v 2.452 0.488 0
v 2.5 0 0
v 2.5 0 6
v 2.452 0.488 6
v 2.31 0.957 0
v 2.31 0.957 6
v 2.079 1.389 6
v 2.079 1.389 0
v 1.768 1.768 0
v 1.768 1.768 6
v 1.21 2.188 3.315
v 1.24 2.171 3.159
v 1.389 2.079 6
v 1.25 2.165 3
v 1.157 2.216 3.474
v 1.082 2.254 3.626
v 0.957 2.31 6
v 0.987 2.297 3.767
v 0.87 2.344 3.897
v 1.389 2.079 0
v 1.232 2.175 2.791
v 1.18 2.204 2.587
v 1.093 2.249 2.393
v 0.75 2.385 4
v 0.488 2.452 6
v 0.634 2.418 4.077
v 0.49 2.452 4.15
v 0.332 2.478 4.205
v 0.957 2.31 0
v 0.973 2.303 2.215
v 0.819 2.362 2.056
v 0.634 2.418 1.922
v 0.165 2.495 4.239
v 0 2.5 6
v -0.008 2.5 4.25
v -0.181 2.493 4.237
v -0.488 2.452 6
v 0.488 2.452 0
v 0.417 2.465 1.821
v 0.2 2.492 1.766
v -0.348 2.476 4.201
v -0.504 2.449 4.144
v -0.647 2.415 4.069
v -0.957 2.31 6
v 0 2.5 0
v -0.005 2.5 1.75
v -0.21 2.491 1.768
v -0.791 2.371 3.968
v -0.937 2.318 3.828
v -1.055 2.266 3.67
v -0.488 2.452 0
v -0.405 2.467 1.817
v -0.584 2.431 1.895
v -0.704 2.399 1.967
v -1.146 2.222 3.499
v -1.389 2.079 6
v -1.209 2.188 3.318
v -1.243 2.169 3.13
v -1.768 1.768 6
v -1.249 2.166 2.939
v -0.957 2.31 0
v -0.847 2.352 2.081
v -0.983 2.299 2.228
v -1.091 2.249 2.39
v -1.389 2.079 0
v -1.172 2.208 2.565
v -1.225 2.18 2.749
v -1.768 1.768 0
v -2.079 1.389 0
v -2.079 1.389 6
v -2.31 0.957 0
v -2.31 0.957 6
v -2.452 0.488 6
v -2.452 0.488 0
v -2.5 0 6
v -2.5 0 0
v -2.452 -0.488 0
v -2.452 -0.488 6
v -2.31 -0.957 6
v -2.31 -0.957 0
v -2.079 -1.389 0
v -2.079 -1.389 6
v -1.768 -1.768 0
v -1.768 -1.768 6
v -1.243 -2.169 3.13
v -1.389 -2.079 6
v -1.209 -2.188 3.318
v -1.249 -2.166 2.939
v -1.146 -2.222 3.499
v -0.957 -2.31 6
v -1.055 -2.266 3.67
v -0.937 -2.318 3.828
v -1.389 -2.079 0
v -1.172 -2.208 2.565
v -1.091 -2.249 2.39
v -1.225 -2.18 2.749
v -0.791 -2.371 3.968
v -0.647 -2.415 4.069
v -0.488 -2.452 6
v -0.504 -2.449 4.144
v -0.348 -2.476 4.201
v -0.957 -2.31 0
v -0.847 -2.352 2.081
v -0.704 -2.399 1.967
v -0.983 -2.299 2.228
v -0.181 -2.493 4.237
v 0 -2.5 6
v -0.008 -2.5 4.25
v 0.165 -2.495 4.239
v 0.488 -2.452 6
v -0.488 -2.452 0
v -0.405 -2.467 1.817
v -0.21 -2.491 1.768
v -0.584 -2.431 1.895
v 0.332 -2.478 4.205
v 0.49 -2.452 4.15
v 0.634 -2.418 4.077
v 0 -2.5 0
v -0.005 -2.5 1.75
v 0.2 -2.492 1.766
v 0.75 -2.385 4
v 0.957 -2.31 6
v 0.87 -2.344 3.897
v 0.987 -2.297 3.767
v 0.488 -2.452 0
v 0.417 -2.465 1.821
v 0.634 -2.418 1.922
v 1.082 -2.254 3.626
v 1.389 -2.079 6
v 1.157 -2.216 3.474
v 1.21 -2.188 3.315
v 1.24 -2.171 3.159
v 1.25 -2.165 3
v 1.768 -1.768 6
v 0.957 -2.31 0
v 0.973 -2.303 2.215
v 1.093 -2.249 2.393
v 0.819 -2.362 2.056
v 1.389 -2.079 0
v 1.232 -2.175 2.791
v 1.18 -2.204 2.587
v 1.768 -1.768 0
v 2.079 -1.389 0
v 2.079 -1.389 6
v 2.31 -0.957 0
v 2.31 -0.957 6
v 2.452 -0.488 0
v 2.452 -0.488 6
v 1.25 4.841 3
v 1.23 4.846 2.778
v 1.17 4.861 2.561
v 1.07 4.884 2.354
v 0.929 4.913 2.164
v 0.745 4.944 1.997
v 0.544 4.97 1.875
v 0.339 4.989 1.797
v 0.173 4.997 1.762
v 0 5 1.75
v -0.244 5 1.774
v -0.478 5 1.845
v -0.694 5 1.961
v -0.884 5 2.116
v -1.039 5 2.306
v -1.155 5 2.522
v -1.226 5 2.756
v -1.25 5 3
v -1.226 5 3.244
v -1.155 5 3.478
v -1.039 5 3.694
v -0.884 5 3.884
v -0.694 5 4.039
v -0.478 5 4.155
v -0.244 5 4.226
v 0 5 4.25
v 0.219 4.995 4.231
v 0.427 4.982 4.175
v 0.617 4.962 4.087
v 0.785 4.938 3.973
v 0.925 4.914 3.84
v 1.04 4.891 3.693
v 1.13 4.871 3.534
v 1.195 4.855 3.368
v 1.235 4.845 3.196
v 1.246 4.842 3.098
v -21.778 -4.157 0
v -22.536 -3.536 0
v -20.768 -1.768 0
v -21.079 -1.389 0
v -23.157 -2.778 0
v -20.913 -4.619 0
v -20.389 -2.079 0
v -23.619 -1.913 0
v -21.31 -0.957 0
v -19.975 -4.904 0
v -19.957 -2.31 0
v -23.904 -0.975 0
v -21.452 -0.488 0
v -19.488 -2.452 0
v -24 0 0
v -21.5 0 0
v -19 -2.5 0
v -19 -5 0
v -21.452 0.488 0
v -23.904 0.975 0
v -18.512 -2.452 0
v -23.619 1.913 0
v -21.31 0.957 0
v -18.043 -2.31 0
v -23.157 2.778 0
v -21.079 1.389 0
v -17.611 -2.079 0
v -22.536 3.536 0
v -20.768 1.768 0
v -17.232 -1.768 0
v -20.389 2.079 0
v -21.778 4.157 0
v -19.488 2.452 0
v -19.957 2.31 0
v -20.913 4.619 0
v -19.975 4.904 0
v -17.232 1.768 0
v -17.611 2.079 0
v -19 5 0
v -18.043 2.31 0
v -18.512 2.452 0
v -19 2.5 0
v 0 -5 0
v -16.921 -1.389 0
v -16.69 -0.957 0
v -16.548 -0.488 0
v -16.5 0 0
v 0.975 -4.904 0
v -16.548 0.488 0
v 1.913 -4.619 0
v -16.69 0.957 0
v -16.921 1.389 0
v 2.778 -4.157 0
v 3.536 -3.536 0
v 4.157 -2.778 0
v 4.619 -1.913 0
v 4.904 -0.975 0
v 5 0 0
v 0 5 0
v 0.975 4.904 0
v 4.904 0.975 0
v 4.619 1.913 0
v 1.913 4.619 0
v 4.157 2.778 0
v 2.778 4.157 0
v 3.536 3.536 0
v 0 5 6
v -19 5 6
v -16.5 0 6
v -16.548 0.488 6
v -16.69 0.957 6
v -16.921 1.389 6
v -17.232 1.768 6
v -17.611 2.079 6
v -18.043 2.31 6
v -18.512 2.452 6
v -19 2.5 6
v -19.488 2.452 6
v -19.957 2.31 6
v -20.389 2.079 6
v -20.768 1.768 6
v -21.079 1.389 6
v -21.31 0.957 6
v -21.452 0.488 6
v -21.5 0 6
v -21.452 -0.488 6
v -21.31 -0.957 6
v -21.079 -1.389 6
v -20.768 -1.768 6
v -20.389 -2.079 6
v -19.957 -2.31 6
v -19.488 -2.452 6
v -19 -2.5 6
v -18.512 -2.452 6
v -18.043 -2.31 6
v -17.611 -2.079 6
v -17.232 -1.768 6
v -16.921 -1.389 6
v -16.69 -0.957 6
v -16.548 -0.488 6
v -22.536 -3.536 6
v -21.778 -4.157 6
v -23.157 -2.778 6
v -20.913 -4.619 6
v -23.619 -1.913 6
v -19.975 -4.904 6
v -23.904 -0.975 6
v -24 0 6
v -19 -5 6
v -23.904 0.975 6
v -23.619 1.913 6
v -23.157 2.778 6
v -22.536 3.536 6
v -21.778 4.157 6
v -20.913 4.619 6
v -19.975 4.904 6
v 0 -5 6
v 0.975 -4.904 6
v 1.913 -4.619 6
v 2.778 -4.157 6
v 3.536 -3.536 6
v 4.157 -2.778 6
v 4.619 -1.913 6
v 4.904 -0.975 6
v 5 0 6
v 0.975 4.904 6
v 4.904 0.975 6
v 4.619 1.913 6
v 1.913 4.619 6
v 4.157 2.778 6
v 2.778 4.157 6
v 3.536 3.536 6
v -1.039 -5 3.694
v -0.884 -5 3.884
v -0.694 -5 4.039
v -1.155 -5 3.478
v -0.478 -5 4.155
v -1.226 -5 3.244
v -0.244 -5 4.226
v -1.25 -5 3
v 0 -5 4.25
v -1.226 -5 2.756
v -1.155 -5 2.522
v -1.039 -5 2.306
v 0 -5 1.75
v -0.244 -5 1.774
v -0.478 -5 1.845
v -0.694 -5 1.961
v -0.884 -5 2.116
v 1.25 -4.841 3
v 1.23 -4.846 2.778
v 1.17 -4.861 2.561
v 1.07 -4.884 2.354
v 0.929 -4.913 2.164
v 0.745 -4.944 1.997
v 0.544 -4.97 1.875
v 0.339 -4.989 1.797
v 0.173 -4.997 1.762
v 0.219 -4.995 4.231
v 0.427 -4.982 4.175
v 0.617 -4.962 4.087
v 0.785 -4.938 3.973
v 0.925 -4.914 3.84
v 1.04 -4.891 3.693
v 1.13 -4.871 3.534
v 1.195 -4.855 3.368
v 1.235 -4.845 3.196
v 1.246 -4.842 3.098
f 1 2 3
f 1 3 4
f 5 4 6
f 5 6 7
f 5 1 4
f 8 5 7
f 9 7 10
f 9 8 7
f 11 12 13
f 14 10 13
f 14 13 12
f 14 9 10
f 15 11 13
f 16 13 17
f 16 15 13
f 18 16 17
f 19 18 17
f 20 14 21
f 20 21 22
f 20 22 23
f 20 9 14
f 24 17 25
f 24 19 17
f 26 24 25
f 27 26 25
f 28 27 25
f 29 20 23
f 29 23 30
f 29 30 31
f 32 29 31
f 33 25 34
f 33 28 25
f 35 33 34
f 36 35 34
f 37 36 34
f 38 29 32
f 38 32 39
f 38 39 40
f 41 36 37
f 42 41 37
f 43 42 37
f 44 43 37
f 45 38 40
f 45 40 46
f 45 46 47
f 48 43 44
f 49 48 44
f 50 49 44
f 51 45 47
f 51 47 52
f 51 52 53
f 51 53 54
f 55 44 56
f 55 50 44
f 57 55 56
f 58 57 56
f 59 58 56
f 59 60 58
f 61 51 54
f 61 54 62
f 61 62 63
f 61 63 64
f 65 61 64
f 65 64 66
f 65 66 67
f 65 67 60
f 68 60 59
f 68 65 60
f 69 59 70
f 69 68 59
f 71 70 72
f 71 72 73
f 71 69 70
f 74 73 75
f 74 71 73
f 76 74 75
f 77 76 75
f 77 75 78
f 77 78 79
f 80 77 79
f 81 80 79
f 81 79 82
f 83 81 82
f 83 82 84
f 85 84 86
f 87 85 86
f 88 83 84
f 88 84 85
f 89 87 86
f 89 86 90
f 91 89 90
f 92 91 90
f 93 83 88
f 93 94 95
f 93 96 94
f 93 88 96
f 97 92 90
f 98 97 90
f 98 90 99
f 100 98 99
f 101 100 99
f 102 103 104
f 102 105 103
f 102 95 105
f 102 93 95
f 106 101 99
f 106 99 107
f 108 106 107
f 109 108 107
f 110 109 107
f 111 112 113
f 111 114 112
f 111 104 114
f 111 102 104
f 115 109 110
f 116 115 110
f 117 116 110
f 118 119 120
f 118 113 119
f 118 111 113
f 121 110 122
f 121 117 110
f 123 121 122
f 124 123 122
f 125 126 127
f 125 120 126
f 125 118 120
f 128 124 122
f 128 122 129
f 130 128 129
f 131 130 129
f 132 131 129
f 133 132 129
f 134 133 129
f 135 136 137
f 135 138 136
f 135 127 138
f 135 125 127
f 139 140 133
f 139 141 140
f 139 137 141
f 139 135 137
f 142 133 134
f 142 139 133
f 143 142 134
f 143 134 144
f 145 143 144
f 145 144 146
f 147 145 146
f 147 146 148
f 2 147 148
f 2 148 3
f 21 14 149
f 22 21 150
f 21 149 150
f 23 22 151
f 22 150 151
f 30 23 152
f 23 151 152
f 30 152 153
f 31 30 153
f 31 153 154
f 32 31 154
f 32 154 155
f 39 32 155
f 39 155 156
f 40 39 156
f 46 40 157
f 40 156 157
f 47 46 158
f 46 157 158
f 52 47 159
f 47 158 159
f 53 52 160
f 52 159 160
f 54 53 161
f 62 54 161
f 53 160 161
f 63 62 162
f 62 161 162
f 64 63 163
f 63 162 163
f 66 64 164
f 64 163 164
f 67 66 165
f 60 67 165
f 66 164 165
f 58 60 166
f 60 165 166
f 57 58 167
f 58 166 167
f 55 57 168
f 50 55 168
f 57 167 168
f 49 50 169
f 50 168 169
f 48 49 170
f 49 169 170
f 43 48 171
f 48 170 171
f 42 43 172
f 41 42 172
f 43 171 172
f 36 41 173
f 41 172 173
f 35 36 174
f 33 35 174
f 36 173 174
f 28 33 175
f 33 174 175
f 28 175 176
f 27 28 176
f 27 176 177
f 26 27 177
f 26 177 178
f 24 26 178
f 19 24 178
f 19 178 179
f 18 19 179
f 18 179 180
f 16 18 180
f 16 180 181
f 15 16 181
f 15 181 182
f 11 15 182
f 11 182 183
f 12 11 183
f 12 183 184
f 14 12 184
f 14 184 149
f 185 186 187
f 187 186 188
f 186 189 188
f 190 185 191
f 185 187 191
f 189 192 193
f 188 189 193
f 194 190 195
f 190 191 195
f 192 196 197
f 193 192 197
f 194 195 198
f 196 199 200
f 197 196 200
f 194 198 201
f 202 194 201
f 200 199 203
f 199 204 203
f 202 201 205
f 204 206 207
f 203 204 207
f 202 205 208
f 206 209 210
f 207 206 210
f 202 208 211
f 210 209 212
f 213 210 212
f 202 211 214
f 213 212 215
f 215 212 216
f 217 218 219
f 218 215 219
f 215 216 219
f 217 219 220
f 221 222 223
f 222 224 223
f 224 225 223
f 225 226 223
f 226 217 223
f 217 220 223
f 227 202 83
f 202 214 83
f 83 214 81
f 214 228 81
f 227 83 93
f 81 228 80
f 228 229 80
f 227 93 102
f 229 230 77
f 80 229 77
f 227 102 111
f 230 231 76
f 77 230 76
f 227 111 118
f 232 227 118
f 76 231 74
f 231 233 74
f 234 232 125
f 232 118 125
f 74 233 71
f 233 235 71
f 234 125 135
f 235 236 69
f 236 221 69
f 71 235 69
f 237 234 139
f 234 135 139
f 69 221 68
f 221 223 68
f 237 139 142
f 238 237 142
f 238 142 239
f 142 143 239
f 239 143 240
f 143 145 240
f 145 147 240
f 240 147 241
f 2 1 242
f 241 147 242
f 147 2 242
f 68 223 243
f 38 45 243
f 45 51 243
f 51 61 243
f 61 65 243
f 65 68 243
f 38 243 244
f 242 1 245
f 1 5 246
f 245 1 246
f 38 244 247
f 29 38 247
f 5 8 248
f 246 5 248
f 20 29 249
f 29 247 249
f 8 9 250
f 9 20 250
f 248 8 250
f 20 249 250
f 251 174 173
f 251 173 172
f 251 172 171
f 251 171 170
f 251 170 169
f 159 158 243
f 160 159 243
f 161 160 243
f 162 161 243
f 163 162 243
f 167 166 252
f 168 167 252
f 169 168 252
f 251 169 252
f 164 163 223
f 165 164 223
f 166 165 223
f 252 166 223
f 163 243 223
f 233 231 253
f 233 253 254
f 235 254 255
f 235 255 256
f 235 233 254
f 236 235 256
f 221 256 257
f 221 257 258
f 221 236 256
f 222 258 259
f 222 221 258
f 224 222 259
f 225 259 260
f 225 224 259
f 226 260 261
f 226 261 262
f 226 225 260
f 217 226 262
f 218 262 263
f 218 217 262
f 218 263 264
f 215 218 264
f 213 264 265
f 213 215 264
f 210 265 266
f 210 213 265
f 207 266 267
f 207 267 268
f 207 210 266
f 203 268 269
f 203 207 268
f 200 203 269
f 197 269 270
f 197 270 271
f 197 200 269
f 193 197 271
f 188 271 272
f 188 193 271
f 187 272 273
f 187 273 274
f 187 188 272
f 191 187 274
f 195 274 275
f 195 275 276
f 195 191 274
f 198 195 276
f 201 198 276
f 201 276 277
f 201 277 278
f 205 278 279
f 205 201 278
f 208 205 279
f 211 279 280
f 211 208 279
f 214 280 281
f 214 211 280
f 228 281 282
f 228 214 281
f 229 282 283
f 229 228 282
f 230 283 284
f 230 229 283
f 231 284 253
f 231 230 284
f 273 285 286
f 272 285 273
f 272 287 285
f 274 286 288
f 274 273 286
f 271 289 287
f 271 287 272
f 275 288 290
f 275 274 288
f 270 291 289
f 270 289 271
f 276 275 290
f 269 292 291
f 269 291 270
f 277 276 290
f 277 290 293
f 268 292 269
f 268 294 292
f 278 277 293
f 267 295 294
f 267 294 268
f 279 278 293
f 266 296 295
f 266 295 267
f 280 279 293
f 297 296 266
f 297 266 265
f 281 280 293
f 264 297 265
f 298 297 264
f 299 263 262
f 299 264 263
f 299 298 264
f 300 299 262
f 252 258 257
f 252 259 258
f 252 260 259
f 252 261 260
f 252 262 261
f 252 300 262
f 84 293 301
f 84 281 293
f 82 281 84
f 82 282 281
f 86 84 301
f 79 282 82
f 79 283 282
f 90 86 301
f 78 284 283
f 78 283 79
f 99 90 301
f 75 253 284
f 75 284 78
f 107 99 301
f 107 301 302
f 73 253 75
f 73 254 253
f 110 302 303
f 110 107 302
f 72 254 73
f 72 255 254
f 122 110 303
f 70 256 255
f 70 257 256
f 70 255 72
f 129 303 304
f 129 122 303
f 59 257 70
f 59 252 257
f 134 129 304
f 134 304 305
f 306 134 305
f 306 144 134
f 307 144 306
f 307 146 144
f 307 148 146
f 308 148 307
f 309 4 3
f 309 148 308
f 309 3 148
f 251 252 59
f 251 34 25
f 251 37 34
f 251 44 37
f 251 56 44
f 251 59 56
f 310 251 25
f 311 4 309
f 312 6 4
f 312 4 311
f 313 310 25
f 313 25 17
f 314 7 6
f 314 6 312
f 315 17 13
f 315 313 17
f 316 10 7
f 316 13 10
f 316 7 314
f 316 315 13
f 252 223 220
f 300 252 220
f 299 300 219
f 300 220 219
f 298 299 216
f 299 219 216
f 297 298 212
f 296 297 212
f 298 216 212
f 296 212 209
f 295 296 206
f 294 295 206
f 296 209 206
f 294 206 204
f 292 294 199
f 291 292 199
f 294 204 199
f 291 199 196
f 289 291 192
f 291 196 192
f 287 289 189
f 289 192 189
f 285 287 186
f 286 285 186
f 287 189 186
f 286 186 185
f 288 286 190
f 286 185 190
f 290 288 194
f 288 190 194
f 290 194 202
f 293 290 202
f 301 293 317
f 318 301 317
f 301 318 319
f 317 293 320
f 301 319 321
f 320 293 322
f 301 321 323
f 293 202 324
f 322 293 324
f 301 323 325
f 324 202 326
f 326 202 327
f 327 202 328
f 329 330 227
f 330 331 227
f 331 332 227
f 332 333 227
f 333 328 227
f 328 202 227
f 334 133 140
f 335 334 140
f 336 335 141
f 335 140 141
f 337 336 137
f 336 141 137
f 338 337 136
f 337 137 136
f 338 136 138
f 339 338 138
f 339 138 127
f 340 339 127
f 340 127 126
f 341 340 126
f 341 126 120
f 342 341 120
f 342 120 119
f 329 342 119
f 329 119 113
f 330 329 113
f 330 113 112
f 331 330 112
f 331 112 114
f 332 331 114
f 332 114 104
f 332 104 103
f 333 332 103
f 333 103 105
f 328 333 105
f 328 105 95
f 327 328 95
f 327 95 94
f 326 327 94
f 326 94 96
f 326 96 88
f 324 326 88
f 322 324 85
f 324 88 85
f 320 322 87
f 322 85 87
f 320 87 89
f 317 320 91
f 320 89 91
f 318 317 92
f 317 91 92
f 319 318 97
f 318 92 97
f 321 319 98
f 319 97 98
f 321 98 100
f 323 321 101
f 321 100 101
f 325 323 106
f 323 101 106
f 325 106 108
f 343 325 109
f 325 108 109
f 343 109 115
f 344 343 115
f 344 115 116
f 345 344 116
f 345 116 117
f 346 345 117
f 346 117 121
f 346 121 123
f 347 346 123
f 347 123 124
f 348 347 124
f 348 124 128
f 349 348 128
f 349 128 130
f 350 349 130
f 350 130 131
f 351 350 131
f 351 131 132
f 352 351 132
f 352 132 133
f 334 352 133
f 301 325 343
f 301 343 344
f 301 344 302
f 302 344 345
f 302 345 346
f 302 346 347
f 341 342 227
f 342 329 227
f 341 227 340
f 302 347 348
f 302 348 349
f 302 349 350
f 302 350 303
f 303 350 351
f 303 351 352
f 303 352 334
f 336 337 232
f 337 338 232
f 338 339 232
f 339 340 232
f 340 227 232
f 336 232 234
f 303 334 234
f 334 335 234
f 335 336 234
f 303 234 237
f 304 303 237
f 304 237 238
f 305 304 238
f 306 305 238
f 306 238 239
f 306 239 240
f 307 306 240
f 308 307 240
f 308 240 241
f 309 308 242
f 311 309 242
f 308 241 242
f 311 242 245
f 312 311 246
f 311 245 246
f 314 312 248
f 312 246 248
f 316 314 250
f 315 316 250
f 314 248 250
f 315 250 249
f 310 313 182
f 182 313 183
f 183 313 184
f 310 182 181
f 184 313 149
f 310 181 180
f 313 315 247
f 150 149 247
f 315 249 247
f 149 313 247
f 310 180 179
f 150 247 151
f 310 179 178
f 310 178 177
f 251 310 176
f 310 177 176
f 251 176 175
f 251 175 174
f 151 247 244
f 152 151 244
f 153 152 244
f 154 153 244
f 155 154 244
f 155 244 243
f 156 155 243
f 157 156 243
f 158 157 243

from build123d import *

# Parameters (mm, degrees)
SKETCH1_R           = 2.5
BOSS_EXTRUDE1_DEPTH = 6
SKETCH2_R           = 1.25
CUT_EXTRUDE1_DEPTH  = 10


with BuildPart() as part:
    # Sketch1 → Boss-Extrude1 (new body)
    with BuildSketch(Plane.XY):
        with BuildLine():
            Line((0, 5), (-19, 5))
            ThreePointArc((-19, 5), (-24, 0), (-19, -5))
            Line((-19, -5), (0, -5))
            ThreePointArc((0, -5), (5, 0), (0, 5))
        make_face()
        with Locations((-19, 0)):
            Circle(SKETCH1_R, mode=Mode.SUBTRACT)
        Circle(SKETCH1_R, mode=Mode.SUBTRACT)
    extrude(amount=BOSS_EXTRUDE1_DEPTH)

    # Sketch2 → Cut-Extrude1 (cut)
    with BuildSketch(Plane(origin=(0, 5, 0), x_dir=(1, 0, 0), z_dir=(0, 1, 0))):
        with Locations((0, -3)):
            Circle(SKETCH2_R)
    extrude(amount=-CUT_EXTRUDE1_DEPTH, mode=Mode.SUBTRACT)


solid = part.part
